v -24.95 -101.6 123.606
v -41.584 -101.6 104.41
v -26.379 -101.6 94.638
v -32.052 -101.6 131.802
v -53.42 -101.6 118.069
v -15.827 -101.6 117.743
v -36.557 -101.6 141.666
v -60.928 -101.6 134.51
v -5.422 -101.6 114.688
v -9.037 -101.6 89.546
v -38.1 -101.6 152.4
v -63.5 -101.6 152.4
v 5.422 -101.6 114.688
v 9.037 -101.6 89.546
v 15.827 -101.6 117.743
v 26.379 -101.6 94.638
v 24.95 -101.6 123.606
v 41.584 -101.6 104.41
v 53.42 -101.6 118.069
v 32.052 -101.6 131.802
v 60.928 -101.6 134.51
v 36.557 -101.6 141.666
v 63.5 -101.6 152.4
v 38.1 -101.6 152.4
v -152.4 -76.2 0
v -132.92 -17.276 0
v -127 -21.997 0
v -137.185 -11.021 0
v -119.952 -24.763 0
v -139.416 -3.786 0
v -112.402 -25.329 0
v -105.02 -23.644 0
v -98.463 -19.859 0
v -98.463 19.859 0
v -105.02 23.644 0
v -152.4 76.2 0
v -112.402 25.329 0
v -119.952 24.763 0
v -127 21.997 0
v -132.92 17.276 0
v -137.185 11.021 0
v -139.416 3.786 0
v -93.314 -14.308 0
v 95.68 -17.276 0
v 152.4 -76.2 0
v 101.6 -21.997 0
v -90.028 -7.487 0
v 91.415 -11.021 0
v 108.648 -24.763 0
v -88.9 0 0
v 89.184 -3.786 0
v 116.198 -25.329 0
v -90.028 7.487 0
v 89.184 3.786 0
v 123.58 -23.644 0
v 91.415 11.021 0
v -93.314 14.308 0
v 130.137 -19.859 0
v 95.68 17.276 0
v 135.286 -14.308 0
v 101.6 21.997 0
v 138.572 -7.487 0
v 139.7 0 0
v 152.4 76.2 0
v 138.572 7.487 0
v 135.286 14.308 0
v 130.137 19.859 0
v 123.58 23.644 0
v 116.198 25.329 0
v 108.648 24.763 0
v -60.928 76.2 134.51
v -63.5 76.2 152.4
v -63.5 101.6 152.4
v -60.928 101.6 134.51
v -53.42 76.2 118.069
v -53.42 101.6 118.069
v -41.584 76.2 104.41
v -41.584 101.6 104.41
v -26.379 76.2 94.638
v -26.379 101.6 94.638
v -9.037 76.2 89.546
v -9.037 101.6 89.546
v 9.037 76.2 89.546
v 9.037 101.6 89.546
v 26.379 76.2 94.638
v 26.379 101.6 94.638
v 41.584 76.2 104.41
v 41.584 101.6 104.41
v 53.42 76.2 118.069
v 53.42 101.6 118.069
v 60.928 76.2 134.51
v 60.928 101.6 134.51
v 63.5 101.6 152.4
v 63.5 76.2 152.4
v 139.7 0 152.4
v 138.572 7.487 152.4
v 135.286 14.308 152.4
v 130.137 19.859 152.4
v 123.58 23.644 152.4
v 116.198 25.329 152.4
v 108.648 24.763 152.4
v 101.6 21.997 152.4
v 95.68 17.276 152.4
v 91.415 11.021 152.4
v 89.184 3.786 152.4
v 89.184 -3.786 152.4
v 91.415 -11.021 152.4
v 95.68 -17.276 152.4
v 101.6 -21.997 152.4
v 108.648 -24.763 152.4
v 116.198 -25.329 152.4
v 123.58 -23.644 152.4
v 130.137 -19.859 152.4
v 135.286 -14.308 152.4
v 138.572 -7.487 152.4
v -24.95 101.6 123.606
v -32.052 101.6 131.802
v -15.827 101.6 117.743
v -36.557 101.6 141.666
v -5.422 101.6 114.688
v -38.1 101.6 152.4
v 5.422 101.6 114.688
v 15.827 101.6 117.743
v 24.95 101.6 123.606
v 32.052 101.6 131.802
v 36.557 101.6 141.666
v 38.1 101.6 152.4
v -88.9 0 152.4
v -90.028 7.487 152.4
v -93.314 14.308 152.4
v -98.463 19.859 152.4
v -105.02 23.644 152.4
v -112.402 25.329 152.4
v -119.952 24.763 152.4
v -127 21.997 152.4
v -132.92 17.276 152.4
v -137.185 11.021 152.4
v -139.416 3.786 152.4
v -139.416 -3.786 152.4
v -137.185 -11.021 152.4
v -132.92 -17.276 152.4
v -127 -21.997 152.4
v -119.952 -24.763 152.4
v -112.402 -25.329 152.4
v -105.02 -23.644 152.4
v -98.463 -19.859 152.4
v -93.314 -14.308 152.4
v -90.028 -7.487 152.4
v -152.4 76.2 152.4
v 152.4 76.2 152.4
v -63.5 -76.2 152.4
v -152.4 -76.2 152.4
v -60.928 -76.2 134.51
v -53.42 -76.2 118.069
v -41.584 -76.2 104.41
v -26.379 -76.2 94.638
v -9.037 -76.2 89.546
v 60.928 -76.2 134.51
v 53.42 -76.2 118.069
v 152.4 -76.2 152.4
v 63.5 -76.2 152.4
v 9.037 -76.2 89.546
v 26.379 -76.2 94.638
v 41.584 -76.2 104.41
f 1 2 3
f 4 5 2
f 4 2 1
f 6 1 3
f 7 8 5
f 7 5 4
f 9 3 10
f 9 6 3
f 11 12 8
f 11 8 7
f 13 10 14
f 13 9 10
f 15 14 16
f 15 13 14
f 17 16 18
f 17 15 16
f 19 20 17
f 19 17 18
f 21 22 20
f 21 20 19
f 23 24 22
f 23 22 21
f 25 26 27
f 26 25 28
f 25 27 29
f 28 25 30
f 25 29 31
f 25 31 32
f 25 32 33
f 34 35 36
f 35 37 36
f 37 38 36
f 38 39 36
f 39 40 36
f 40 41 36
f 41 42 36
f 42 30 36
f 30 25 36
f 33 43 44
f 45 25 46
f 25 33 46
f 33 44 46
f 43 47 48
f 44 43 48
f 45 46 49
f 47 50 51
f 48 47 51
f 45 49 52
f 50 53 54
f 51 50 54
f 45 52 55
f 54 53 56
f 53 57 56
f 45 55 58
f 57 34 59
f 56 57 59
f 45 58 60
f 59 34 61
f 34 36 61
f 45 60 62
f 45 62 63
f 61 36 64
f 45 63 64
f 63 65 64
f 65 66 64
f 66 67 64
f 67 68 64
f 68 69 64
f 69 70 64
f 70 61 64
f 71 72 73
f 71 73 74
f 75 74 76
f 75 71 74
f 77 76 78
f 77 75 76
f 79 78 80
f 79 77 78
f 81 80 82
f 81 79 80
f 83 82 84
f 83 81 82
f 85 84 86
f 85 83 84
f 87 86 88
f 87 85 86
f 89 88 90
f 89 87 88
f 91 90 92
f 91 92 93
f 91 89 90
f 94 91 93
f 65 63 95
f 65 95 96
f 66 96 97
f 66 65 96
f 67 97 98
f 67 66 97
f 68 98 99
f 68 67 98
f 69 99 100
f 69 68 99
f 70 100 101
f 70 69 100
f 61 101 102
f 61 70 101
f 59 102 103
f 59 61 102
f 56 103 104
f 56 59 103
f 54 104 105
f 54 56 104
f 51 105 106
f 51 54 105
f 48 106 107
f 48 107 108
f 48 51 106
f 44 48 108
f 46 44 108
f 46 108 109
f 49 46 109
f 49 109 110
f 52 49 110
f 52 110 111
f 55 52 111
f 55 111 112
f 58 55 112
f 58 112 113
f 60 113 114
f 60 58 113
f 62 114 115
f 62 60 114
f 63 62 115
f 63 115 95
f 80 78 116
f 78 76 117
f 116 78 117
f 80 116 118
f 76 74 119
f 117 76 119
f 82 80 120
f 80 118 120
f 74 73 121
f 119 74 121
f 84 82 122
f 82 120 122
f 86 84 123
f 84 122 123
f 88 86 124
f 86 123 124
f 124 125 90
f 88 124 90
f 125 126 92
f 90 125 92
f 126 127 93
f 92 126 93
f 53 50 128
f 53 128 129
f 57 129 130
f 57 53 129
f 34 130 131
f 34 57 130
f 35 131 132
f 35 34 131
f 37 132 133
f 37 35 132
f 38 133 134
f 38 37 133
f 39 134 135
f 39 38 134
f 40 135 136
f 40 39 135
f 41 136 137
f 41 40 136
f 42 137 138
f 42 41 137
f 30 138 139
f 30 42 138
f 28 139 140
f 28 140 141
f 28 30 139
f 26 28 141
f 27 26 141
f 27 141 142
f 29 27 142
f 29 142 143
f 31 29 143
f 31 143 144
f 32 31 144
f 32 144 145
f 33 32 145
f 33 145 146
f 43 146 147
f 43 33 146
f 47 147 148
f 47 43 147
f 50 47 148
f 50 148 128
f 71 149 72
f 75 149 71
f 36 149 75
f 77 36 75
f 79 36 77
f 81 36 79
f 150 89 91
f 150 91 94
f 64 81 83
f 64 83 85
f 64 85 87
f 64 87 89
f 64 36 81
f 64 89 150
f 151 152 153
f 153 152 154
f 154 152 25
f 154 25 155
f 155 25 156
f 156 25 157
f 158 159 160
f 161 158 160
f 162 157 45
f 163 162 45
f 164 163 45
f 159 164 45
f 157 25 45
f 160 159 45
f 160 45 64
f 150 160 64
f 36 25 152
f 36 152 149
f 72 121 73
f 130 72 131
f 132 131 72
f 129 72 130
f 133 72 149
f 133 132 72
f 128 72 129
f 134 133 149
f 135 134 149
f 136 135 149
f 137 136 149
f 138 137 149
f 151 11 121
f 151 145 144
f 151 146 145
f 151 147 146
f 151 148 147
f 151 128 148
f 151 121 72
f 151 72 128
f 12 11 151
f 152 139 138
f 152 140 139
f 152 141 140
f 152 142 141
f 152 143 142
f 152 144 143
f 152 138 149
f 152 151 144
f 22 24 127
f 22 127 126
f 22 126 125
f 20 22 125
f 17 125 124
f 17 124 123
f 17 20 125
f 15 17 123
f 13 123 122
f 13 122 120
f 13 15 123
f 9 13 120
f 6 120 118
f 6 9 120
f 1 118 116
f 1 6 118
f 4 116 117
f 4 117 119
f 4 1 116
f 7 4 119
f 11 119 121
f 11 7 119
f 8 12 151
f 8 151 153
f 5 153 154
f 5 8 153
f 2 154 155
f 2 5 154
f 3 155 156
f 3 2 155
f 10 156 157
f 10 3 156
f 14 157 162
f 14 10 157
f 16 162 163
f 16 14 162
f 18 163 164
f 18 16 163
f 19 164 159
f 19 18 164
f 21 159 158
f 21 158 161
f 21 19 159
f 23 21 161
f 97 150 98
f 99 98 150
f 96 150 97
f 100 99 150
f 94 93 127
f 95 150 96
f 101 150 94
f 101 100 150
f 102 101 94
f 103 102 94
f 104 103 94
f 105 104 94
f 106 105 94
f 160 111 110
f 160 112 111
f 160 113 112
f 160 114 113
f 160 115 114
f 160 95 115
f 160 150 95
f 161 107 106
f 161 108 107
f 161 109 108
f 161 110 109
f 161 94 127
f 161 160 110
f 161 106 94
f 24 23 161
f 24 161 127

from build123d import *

# Parameters (mm, degrees)
F0_W     = 304.8
F0_H     = 152.4
F0_R     = 25.4
F1_DEPTH = 152.4
F3_DEPTH = 101.6
F4_DEPTH = 177.801


with BuildPart() as f1:
    # F0 (on Top) → F1 (new body)
    with BuildSketch(Plane.XY):
        Rectangle(F0_W, F0_H)
        with Locations((-114.3, 0)):
            Circle(F0_R, mode=Mode.SUBTRACT)
        with Locations((114.3, 0)):
            Circle(F0_R, mode=Mode.SUBTRACT)
    extrude(amount=F1_DEPTH)

    # F2 (on Front) → F3 (join, symmetric)
    with BuildSketch(Plane.XZ):
        with BuildLine():
            Line((63.5, 152.4), (38.1, 152.4))
            ThreePointArc((38.1, 152.4), (0, 114.3), (-38.1, 152.4))
            Line((-38.1, 152.4), (-63.5, 152.4))
            ThreePointArc((-63.5, 152.4), (0, 88.9), (63.5, 152.4))
        make_face()
    extrude(amount=F3_DEPTH, both=True)

    # F4 (cut, through all): a face of the model
    f4_faces = [f1.faces().sort_by_distance(p)[0] for p in [
        (0, -76.2, 136.2298577819),
    ]]
    extrude(f4_faces, amount=-F4_DEPTH, mode=Mode.SUBTRACT)


solid = f1.part
